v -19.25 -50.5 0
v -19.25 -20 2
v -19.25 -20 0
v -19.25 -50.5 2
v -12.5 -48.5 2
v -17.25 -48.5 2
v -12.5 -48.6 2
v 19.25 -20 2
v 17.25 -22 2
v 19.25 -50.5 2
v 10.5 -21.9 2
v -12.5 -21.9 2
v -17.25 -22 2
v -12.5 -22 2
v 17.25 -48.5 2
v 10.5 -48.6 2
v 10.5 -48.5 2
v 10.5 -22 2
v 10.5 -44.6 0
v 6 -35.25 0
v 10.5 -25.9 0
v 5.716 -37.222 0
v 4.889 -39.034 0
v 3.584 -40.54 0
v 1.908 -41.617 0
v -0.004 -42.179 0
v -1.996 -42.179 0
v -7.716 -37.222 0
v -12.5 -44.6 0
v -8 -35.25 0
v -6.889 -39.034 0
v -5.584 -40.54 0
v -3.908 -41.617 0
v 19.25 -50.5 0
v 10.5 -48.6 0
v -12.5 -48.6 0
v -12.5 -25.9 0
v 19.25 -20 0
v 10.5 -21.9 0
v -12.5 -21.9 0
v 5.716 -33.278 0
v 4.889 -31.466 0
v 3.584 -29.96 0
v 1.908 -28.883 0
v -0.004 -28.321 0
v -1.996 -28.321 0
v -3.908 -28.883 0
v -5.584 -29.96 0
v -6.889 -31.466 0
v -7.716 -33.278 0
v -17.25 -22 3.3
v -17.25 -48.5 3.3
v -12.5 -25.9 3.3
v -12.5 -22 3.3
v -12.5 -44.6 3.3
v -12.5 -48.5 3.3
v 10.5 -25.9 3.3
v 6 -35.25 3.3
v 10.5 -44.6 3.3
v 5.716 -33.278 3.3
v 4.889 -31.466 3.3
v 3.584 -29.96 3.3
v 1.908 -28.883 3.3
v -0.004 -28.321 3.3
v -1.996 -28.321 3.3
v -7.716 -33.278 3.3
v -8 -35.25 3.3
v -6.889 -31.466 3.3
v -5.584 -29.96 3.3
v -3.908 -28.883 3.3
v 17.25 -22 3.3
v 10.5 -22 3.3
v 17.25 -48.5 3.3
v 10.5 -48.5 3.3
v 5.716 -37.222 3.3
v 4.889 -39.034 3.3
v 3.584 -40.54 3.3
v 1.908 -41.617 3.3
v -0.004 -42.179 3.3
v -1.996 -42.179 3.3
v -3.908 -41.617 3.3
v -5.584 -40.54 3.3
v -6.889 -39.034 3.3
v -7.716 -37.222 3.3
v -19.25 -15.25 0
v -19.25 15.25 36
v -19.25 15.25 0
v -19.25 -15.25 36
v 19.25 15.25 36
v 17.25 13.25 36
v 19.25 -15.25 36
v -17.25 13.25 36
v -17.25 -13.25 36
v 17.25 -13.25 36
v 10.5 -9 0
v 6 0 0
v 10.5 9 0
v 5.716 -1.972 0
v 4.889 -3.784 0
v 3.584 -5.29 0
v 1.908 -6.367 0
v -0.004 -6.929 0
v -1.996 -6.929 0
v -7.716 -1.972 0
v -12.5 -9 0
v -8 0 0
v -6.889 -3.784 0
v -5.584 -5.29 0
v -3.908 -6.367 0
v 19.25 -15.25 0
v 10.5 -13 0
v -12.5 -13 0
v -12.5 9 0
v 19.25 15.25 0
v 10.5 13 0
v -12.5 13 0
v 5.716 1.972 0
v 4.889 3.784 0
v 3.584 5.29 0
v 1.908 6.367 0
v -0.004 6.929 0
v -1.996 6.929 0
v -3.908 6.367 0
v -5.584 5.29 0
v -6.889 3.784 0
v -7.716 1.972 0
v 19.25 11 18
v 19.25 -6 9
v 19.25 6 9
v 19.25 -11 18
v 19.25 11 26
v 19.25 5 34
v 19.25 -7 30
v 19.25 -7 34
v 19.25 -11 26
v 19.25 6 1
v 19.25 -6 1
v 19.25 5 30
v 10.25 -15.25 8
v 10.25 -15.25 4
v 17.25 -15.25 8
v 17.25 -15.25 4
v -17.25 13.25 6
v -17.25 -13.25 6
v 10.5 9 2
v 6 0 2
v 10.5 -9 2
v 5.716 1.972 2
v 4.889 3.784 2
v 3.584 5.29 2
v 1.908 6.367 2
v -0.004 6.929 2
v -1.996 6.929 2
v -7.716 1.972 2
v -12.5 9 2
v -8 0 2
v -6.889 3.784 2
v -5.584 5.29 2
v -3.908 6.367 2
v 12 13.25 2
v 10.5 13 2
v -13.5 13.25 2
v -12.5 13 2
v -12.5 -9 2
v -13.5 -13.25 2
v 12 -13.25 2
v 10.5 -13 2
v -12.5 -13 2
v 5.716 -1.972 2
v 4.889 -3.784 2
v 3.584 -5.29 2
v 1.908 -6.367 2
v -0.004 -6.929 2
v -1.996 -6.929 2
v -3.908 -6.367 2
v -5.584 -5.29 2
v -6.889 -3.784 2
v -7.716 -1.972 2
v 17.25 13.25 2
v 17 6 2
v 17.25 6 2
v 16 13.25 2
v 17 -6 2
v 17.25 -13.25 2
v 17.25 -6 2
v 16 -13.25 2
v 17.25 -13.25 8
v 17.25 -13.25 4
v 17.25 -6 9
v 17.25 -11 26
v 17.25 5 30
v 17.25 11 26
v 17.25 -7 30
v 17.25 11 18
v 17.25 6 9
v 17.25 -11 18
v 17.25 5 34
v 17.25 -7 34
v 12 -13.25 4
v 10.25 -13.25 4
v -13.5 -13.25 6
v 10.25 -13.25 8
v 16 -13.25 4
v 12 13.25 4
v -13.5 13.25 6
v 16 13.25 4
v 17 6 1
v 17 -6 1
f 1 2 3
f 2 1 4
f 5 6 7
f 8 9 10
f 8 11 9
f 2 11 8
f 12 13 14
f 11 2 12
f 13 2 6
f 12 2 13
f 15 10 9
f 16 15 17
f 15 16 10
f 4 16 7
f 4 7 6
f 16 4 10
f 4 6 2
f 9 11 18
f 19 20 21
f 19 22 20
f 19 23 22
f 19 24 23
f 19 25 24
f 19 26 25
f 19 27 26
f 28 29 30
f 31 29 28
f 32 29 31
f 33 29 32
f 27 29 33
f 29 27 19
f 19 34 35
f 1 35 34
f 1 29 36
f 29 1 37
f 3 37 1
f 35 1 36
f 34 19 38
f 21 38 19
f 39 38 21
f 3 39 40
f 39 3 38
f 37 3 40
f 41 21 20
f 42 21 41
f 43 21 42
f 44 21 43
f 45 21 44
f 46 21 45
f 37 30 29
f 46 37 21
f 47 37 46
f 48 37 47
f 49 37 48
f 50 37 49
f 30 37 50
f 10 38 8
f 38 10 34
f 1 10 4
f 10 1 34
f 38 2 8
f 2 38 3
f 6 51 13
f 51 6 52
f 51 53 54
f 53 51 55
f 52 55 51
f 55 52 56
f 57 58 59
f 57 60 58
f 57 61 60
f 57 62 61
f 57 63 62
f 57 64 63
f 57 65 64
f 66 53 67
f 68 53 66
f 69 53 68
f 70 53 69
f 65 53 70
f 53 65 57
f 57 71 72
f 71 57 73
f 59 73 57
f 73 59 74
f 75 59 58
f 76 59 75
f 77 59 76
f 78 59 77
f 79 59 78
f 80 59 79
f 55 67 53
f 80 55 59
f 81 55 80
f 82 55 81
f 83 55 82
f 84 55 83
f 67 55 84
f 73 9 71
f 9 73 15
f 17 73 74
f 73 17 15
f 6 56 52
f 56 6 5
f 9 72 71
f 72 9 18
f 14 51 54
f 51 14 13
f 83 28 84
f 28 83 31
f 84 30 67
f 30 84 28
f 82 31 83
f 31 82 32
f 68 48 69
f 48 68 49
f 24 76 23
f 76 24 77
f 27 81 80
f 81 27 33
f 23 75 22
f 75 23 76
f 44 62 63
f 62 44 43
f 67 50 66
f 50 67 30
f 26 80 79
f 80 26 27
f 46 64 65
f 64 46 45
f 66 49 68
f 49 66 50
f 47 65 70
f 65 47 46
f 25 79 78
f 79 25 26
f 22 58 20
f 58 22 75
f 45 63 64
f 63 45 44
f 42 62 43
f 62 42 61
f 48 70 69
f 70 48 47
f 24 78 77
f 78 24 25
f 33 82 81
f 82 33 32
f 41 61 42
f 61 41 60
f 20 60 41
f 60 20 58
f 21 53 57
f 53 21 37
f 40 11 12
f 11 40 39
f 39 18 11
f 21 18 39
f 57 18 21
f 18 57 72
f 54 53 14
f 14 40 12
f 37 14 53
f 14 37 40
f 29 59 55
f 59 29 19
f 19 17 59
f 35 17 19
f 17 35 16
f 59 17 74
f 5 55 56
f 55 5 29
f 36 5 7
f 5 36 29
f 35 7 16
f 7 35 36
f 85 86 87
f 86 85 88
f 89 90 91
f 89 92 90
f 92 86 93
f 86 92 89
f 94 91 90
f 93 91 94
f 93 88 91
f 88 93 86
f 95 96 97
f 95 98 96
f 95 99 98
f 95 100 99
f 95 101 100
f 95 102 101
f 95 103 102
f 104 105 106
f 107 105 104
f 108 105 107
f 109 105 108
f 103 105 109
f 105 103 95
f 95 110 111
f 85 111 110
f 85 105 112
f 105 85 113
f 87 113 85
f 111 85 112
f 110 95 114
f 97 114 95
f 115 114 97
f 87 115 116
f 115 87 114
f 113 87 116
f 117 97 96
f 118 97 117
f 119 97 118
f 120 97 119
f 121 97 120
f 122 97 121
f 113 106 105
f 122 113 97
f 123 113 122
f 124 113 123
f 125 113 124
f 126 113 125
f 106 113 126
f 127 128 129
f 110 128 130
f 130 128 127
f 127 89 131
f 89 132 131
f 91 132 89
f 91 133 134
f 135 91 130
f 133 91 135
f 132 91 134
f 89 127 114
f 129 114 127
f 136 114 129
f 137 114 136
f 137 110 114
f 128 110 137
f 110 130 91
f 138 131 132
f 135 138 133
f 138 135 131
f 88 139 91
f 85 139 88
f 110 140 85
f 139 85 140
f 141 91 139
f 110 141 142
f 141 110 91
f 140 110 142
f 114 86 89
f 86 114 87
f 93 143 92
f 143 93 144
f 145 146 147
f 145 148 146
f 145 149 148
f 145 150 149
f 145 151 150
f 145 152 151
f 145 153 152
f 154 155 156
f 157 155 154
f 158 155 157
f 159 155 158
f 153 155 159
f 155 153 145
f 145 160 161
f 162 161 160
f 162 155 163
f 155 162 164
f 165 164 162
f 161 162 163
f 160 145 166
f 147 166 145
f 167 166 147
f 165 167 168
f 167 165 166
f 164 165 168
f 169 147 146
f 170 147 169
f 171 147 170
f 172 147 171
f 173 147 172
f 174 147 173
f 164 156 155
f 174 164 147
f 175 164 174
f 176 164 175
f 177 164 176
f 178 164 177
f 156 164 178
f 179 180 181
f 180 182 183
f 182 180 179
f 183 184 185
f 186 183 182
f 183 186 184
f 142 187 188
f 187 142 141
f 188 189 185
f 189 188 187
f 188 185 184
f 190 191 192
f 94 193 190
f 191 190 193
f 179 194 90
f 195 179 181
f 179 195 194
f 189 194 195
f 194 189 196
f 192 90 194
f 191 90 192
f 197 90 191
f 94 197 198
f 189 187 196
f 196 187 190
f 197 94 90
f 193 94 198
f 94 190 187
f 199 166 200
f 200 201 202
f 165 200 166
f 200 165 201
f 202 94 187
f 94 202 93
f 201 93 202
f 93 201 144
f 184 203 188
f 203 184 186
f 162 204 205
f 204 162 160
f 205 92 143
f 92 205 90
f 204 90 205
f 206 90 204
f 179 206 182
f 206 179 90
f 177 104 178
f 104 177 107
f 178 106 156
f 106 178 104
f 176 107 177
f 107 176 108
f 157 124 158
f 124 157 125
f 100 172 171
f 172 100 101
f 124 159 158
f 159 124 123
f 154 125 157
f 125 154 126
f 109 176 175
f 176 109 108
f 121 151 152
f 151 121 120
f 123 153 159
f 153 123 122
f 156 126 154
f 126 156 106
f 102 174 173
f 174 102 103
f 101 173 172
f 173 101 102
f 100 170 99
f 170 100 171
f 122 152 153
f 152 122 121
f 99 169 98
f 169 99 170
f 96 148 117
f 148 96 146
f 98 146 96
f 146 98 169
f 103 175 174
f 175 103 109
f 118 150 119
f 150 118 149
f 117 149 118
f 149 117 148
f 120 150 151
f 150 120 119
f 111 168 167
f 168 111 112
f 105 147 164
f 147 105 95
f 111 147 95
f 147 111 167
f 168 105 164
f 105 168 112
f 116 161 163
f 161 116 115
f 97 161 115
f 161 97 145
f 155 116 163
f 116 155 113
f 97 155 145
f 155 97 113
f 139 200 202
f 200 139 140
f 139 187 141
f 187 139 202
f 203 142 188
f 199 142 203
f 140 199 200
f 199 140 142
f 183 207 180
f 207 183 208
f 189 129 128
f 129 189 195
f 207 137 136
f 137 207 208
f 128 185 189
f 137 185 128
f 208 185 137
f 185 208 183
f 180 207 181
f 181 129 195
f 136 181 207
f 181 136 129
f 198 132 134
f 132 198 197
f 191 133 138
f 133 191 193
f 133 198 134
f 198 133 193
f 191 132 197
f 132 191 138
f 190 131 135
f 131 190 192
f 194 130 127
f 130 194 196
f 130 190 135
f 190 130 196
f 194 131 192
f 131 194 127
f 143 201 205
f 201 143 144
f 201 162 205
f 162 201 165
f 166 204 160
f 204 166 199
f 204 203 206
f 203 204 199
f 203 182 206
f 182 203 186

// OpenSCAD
//
// WeMOS D1 Mini Stack Enclosure Script
//
// I wrote this script to generate a suitable 3-d printed enclosure for a WeMOS "stack" of shields.
// Since there are a variety of connectors, sizes and arrangements, I decided to let the customizer
// allow for various positionings of each shields port.
//
// To use, you will need to assemble your device and measure the total height of the case, and the
// height offsets for any shields that require an opening in the case.
//
// For instance, I have a WeMOS D1 Mini with a battery shield and then an SD Card shield on top of 
// that.  All have stackable headers, that have had their pins trimmed to make the stack as short
// as possible.  The resulting measurements of the stack yield the default values of this script.
//

/* [Height] */

// Final height of the stack walls.
height = 36.0;

/* [Shield Ports] */

// Distance from the bottom to the bottom of the usb connector opening (0.0 to omit)
usb_height = 1.0;
// Distance from the bottom to the bottom of the microsd shield opening (0.0 to omit)
microsd_height = 30;
// Distance from the bottom to the bottom of the battery shield connector opening (0.0 to omit)
battery_height = 18.0;
// Distance from the bottom to the bottom of the relay shield connector terminal opening (0.0 to omit)
relay_height = 0.0;

// ---------------------------------------------------------------------------------------------------------
// do not need to modify anything below here
// ---------------------------------------------------------------------------------------------------------
/* [Hidden] */

thickness = 2.0;
fudge = 0.1;

width = 38.5;
depth = 30.50;
 
cavity_width = width - (2 * thickness);
cavity_depth = depth - (2 * thickness);
cavity_height = height - thickness + fudge;

hole_diameter = 7.0;

slit_width = 4.0;
slit_height = 23.0;

// lid
rotate([0, 0, 180])
difference() {
    union () {
        translate([-(width / 2.0), 20, 0.0]) cube([width, depth, 2.0]);
        translate([-(cavity_width / 2.0), 22, 2.0]) cube([cavity_width, cavity_depth, 1.3]);            
    }
    translate([1, 22 + (cavity_depth / 2), 2.5]) cylinder(h = 5 + fudge, r1 = hole_diameter, r2 =hole_diameter, center = true);
    rotate([0, 0, 90]) translate([21.9, -12.5, 0]) cube([slit_width, slit_height, 10]);
    rotate([0, 0, 90]) translate([44.6, -12.5, 0]) cube([slit_width, slit_height, 10]);
}

// base
rotate([0, 0, 180])
union() {
    translate([13.5, -(cavity_depth / 2.0), 2]) cube([4.0, cavity_depth, 4.0]);
    translate([-16, -(cavity_depth / 2.0), 2]) cube([4.0, cavity_depth, 2.0]);
    difference () {
        translate([0, 0, height / 2.0]) cube([width, depth, height], center = true); 
        translate([0, 0, (cavity_height / 2.0) + thickness]) cube([cavity_width, cavity_depth, cavity_height], center = true);
        translate([1, 0, thickness / 2.0]) cylinder(h = thickness + fudge, r1 = hole_diameter, r2 = hole_diameter, center = true);
        rotate([0, 0, 90]) translate([9, -12.5, 0]) cube([slit_width, slit_height, 5]);
        rotate([0, 0, 90]) translate([-13, -12.5, 0]) cube([slit_width, slit_height, 5]);
        translate([-17.25, 13.0, 4]) cube([7, 3, 4]);        
        if (usb_height > 0.0)
        {
            translate([-20, -6, usb_height]) cube([3, 12, 8]);
        }
        if (microsd_height > 0.0)
        {
            translate([-20, -5, microsd_height]) cube([3, 12, 4]);
        }
        if (battery_height > 0.0)
        {
            translate([-20, -11, battery_height]) cube([3, 22, 8]);
        }
        if (relay_height > 0.0)
        {
            translate([-20, -6, relay_height]) cube([3, 15, 7]);
        }
    }
}
